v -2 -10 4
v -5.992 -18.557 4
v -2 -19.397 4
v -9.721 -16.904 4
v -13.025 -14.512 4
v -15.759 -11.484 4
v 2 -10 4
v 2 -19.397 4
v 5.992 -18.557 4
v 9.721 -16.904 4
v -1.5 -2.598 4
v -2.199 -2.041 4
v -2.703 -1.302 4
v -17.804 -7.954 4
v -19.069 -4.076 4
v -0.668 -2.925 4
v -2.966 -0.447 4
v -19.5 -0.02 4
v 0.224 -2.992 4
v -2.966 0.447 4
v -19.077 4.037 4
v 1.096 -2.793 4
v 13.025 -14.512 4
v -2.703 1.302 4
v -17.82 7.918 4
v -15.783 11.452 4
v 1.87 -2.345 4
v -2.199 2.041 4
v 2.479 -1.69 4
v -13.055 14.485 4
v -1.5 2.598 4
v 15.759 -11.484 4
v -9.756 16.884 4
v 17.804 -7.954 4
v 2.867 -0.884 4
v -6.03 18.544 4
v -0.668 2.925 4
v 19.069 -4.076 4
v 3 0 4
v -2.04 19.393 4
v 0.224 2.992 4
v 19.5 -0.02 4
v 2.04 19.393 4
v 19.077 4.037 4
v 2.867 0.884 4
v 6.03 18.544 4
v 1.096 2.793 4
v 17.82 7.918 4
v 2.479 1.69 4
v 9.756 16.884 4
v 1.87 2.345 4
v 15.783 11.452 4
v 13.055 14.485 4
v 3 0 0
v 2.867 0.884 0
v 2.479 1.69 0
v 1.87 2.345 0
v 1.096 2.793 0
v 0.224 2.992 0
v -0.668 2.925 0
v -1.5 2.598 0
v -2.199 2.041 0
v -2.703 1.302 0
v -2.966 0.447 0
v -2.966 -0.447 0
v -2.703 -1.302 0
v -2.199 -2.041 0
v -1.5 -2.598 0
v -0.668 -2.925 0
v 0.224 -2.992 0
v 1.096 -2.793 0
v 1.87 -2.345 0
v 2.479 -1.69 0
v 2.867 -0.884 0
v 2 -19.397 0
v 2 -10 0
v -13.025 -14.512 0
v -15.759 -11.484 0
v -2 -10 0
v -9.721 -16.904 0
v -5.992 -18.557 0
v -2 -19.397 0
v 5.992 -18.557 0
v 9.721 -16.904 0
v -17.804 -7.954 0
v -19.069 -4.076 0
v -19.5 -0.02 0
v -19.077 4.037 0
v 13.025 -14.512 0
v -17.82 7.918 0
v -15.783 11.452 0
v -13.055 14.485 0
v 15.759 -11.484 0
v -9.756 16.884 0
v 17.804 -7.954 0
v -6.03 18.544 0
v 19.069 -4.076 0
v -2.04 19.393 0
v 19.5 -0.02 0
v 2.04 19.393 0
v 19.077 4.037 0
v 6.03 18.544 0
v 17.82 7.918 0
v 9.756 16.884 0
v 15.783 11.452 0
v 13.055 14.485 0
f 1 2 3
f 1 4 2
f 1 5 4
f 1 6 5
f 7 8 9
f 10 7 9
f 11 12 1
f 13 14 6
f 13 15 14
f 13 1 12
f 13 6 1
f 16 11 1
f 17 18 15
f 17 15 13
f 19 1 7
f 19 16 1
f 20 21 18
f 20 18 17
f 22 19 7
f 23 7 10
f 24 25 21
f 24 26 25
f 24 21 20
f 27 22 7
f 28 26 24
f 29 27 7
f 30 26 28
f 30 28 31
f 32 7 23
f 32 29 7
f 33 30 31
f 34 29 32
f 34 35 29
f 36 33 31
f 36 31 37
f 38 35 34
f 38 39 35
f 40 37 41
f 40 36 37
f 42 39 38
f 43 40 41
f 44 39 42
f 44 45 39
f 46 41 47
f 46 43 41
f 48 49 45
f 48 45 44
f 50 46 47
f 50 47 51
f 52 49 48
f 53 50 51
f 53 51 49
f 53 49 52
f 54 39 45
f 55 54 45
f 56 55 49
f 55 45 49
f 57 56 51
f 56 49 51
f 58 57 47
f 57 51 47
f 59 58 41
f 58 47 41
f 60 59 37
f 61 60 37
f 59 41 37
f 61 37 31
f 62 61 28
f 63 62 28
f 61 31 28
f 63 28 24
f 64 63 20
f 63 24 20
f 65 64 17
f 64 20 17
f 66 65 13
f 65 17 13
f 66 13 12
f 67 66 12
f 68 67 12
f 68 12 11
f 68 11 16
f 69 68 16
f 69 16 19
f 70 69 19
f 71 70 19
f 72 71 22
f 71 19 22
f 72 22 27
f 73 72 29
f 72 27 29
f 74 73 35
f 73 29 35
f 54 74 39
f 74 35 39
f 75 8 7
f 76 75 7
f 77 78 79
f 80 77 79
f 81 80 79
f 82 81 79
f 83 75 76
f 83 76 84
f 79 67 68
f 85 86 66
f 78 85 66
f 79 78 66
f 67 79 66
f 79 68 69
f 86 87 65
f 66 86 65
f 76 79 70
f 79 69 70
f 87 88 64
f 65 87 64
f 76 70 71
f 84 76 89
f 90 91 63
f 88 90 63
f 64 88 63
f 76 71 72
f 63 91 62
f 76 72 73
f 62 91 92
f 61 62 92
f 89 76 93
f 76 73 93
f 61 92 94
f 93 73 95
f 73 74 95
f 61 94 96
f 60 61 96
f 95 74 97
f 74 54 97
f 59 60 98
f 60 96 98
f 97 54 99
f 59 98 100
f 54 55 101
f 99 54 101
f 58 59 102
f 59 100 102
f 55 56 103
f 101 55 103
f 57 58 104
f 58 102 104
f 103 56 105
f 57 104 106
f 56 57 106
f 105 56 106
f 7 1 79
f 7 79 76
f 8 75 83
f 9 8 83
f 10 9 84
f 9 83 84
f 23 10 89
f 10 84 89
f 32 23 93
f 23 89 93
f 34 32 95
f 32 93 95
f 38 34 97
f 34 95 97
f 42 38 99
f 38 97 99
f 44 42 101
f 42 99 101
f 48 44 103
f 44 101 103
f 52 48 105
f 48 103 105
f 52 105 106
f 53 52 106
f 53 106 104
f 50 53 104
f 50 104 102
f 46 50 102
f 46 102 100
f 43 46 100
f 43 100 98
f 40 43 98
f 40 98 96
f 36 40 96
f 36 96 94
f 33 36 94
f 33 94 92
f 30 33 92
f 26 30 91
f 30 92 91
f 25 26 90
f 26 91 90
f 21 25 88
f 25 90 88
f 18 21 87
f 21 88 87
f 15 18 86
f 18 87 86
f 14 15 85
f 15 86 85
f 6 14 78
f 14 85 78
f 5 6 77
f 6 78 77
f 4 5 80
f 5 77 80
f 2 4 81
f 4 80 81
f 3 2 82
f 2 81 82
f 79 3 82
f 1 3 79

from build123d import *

# Parameters (mm, degrees)
SKIZZE1_R                       = 19.5
AUFSATZ_LINEAR_AUSTRAGEN1_DEPTH = 4
SKIZZE4_R                       = 3
SCHNITT_LINEAR_AUSTRAGEN2_DEPTH = 4
SKIZZE6_W                       = 4
SKIZZE6_H                       = 10
SCHNITT_LINEAR_AUSTRAGEN3_DEPTH = 4


with BuildPart() as part:
    # Skizze1 → Aufsatz-Linear austragen1 (new body)
    with BuildSketch(Plane.XY):
        Circle(SKIZZE1_R)
    extrude(amount=AUFSATZ_LINEAR_AUSTRAGEN1_DEPTH)

    # Skizze4 → Schnitt-Linear austragen2 (cut)
    with BuildSketch(Plane.XY.offset(4)):
        Circle(SKIZZE4_R)
    extrude(amount=-SCHNITT_LINEAR_AUSTRAGEN2_DEPTH, mode=Mode.SUBTRACT)

    # Skizze6 → Schnitt-Linear austragen3 (cut)
    with BuildSketch(Plane.XY.offset(4)):
        with Locations((0, -15)):
            Rectangle(SKIZZE6_W, SKIZZE6_H)
    extrude(amount=-SCHNITT_LINEAR_AUSTRAGEN3_DEPTH, mode=Mode.SUBTRACT)


solid = part.part
